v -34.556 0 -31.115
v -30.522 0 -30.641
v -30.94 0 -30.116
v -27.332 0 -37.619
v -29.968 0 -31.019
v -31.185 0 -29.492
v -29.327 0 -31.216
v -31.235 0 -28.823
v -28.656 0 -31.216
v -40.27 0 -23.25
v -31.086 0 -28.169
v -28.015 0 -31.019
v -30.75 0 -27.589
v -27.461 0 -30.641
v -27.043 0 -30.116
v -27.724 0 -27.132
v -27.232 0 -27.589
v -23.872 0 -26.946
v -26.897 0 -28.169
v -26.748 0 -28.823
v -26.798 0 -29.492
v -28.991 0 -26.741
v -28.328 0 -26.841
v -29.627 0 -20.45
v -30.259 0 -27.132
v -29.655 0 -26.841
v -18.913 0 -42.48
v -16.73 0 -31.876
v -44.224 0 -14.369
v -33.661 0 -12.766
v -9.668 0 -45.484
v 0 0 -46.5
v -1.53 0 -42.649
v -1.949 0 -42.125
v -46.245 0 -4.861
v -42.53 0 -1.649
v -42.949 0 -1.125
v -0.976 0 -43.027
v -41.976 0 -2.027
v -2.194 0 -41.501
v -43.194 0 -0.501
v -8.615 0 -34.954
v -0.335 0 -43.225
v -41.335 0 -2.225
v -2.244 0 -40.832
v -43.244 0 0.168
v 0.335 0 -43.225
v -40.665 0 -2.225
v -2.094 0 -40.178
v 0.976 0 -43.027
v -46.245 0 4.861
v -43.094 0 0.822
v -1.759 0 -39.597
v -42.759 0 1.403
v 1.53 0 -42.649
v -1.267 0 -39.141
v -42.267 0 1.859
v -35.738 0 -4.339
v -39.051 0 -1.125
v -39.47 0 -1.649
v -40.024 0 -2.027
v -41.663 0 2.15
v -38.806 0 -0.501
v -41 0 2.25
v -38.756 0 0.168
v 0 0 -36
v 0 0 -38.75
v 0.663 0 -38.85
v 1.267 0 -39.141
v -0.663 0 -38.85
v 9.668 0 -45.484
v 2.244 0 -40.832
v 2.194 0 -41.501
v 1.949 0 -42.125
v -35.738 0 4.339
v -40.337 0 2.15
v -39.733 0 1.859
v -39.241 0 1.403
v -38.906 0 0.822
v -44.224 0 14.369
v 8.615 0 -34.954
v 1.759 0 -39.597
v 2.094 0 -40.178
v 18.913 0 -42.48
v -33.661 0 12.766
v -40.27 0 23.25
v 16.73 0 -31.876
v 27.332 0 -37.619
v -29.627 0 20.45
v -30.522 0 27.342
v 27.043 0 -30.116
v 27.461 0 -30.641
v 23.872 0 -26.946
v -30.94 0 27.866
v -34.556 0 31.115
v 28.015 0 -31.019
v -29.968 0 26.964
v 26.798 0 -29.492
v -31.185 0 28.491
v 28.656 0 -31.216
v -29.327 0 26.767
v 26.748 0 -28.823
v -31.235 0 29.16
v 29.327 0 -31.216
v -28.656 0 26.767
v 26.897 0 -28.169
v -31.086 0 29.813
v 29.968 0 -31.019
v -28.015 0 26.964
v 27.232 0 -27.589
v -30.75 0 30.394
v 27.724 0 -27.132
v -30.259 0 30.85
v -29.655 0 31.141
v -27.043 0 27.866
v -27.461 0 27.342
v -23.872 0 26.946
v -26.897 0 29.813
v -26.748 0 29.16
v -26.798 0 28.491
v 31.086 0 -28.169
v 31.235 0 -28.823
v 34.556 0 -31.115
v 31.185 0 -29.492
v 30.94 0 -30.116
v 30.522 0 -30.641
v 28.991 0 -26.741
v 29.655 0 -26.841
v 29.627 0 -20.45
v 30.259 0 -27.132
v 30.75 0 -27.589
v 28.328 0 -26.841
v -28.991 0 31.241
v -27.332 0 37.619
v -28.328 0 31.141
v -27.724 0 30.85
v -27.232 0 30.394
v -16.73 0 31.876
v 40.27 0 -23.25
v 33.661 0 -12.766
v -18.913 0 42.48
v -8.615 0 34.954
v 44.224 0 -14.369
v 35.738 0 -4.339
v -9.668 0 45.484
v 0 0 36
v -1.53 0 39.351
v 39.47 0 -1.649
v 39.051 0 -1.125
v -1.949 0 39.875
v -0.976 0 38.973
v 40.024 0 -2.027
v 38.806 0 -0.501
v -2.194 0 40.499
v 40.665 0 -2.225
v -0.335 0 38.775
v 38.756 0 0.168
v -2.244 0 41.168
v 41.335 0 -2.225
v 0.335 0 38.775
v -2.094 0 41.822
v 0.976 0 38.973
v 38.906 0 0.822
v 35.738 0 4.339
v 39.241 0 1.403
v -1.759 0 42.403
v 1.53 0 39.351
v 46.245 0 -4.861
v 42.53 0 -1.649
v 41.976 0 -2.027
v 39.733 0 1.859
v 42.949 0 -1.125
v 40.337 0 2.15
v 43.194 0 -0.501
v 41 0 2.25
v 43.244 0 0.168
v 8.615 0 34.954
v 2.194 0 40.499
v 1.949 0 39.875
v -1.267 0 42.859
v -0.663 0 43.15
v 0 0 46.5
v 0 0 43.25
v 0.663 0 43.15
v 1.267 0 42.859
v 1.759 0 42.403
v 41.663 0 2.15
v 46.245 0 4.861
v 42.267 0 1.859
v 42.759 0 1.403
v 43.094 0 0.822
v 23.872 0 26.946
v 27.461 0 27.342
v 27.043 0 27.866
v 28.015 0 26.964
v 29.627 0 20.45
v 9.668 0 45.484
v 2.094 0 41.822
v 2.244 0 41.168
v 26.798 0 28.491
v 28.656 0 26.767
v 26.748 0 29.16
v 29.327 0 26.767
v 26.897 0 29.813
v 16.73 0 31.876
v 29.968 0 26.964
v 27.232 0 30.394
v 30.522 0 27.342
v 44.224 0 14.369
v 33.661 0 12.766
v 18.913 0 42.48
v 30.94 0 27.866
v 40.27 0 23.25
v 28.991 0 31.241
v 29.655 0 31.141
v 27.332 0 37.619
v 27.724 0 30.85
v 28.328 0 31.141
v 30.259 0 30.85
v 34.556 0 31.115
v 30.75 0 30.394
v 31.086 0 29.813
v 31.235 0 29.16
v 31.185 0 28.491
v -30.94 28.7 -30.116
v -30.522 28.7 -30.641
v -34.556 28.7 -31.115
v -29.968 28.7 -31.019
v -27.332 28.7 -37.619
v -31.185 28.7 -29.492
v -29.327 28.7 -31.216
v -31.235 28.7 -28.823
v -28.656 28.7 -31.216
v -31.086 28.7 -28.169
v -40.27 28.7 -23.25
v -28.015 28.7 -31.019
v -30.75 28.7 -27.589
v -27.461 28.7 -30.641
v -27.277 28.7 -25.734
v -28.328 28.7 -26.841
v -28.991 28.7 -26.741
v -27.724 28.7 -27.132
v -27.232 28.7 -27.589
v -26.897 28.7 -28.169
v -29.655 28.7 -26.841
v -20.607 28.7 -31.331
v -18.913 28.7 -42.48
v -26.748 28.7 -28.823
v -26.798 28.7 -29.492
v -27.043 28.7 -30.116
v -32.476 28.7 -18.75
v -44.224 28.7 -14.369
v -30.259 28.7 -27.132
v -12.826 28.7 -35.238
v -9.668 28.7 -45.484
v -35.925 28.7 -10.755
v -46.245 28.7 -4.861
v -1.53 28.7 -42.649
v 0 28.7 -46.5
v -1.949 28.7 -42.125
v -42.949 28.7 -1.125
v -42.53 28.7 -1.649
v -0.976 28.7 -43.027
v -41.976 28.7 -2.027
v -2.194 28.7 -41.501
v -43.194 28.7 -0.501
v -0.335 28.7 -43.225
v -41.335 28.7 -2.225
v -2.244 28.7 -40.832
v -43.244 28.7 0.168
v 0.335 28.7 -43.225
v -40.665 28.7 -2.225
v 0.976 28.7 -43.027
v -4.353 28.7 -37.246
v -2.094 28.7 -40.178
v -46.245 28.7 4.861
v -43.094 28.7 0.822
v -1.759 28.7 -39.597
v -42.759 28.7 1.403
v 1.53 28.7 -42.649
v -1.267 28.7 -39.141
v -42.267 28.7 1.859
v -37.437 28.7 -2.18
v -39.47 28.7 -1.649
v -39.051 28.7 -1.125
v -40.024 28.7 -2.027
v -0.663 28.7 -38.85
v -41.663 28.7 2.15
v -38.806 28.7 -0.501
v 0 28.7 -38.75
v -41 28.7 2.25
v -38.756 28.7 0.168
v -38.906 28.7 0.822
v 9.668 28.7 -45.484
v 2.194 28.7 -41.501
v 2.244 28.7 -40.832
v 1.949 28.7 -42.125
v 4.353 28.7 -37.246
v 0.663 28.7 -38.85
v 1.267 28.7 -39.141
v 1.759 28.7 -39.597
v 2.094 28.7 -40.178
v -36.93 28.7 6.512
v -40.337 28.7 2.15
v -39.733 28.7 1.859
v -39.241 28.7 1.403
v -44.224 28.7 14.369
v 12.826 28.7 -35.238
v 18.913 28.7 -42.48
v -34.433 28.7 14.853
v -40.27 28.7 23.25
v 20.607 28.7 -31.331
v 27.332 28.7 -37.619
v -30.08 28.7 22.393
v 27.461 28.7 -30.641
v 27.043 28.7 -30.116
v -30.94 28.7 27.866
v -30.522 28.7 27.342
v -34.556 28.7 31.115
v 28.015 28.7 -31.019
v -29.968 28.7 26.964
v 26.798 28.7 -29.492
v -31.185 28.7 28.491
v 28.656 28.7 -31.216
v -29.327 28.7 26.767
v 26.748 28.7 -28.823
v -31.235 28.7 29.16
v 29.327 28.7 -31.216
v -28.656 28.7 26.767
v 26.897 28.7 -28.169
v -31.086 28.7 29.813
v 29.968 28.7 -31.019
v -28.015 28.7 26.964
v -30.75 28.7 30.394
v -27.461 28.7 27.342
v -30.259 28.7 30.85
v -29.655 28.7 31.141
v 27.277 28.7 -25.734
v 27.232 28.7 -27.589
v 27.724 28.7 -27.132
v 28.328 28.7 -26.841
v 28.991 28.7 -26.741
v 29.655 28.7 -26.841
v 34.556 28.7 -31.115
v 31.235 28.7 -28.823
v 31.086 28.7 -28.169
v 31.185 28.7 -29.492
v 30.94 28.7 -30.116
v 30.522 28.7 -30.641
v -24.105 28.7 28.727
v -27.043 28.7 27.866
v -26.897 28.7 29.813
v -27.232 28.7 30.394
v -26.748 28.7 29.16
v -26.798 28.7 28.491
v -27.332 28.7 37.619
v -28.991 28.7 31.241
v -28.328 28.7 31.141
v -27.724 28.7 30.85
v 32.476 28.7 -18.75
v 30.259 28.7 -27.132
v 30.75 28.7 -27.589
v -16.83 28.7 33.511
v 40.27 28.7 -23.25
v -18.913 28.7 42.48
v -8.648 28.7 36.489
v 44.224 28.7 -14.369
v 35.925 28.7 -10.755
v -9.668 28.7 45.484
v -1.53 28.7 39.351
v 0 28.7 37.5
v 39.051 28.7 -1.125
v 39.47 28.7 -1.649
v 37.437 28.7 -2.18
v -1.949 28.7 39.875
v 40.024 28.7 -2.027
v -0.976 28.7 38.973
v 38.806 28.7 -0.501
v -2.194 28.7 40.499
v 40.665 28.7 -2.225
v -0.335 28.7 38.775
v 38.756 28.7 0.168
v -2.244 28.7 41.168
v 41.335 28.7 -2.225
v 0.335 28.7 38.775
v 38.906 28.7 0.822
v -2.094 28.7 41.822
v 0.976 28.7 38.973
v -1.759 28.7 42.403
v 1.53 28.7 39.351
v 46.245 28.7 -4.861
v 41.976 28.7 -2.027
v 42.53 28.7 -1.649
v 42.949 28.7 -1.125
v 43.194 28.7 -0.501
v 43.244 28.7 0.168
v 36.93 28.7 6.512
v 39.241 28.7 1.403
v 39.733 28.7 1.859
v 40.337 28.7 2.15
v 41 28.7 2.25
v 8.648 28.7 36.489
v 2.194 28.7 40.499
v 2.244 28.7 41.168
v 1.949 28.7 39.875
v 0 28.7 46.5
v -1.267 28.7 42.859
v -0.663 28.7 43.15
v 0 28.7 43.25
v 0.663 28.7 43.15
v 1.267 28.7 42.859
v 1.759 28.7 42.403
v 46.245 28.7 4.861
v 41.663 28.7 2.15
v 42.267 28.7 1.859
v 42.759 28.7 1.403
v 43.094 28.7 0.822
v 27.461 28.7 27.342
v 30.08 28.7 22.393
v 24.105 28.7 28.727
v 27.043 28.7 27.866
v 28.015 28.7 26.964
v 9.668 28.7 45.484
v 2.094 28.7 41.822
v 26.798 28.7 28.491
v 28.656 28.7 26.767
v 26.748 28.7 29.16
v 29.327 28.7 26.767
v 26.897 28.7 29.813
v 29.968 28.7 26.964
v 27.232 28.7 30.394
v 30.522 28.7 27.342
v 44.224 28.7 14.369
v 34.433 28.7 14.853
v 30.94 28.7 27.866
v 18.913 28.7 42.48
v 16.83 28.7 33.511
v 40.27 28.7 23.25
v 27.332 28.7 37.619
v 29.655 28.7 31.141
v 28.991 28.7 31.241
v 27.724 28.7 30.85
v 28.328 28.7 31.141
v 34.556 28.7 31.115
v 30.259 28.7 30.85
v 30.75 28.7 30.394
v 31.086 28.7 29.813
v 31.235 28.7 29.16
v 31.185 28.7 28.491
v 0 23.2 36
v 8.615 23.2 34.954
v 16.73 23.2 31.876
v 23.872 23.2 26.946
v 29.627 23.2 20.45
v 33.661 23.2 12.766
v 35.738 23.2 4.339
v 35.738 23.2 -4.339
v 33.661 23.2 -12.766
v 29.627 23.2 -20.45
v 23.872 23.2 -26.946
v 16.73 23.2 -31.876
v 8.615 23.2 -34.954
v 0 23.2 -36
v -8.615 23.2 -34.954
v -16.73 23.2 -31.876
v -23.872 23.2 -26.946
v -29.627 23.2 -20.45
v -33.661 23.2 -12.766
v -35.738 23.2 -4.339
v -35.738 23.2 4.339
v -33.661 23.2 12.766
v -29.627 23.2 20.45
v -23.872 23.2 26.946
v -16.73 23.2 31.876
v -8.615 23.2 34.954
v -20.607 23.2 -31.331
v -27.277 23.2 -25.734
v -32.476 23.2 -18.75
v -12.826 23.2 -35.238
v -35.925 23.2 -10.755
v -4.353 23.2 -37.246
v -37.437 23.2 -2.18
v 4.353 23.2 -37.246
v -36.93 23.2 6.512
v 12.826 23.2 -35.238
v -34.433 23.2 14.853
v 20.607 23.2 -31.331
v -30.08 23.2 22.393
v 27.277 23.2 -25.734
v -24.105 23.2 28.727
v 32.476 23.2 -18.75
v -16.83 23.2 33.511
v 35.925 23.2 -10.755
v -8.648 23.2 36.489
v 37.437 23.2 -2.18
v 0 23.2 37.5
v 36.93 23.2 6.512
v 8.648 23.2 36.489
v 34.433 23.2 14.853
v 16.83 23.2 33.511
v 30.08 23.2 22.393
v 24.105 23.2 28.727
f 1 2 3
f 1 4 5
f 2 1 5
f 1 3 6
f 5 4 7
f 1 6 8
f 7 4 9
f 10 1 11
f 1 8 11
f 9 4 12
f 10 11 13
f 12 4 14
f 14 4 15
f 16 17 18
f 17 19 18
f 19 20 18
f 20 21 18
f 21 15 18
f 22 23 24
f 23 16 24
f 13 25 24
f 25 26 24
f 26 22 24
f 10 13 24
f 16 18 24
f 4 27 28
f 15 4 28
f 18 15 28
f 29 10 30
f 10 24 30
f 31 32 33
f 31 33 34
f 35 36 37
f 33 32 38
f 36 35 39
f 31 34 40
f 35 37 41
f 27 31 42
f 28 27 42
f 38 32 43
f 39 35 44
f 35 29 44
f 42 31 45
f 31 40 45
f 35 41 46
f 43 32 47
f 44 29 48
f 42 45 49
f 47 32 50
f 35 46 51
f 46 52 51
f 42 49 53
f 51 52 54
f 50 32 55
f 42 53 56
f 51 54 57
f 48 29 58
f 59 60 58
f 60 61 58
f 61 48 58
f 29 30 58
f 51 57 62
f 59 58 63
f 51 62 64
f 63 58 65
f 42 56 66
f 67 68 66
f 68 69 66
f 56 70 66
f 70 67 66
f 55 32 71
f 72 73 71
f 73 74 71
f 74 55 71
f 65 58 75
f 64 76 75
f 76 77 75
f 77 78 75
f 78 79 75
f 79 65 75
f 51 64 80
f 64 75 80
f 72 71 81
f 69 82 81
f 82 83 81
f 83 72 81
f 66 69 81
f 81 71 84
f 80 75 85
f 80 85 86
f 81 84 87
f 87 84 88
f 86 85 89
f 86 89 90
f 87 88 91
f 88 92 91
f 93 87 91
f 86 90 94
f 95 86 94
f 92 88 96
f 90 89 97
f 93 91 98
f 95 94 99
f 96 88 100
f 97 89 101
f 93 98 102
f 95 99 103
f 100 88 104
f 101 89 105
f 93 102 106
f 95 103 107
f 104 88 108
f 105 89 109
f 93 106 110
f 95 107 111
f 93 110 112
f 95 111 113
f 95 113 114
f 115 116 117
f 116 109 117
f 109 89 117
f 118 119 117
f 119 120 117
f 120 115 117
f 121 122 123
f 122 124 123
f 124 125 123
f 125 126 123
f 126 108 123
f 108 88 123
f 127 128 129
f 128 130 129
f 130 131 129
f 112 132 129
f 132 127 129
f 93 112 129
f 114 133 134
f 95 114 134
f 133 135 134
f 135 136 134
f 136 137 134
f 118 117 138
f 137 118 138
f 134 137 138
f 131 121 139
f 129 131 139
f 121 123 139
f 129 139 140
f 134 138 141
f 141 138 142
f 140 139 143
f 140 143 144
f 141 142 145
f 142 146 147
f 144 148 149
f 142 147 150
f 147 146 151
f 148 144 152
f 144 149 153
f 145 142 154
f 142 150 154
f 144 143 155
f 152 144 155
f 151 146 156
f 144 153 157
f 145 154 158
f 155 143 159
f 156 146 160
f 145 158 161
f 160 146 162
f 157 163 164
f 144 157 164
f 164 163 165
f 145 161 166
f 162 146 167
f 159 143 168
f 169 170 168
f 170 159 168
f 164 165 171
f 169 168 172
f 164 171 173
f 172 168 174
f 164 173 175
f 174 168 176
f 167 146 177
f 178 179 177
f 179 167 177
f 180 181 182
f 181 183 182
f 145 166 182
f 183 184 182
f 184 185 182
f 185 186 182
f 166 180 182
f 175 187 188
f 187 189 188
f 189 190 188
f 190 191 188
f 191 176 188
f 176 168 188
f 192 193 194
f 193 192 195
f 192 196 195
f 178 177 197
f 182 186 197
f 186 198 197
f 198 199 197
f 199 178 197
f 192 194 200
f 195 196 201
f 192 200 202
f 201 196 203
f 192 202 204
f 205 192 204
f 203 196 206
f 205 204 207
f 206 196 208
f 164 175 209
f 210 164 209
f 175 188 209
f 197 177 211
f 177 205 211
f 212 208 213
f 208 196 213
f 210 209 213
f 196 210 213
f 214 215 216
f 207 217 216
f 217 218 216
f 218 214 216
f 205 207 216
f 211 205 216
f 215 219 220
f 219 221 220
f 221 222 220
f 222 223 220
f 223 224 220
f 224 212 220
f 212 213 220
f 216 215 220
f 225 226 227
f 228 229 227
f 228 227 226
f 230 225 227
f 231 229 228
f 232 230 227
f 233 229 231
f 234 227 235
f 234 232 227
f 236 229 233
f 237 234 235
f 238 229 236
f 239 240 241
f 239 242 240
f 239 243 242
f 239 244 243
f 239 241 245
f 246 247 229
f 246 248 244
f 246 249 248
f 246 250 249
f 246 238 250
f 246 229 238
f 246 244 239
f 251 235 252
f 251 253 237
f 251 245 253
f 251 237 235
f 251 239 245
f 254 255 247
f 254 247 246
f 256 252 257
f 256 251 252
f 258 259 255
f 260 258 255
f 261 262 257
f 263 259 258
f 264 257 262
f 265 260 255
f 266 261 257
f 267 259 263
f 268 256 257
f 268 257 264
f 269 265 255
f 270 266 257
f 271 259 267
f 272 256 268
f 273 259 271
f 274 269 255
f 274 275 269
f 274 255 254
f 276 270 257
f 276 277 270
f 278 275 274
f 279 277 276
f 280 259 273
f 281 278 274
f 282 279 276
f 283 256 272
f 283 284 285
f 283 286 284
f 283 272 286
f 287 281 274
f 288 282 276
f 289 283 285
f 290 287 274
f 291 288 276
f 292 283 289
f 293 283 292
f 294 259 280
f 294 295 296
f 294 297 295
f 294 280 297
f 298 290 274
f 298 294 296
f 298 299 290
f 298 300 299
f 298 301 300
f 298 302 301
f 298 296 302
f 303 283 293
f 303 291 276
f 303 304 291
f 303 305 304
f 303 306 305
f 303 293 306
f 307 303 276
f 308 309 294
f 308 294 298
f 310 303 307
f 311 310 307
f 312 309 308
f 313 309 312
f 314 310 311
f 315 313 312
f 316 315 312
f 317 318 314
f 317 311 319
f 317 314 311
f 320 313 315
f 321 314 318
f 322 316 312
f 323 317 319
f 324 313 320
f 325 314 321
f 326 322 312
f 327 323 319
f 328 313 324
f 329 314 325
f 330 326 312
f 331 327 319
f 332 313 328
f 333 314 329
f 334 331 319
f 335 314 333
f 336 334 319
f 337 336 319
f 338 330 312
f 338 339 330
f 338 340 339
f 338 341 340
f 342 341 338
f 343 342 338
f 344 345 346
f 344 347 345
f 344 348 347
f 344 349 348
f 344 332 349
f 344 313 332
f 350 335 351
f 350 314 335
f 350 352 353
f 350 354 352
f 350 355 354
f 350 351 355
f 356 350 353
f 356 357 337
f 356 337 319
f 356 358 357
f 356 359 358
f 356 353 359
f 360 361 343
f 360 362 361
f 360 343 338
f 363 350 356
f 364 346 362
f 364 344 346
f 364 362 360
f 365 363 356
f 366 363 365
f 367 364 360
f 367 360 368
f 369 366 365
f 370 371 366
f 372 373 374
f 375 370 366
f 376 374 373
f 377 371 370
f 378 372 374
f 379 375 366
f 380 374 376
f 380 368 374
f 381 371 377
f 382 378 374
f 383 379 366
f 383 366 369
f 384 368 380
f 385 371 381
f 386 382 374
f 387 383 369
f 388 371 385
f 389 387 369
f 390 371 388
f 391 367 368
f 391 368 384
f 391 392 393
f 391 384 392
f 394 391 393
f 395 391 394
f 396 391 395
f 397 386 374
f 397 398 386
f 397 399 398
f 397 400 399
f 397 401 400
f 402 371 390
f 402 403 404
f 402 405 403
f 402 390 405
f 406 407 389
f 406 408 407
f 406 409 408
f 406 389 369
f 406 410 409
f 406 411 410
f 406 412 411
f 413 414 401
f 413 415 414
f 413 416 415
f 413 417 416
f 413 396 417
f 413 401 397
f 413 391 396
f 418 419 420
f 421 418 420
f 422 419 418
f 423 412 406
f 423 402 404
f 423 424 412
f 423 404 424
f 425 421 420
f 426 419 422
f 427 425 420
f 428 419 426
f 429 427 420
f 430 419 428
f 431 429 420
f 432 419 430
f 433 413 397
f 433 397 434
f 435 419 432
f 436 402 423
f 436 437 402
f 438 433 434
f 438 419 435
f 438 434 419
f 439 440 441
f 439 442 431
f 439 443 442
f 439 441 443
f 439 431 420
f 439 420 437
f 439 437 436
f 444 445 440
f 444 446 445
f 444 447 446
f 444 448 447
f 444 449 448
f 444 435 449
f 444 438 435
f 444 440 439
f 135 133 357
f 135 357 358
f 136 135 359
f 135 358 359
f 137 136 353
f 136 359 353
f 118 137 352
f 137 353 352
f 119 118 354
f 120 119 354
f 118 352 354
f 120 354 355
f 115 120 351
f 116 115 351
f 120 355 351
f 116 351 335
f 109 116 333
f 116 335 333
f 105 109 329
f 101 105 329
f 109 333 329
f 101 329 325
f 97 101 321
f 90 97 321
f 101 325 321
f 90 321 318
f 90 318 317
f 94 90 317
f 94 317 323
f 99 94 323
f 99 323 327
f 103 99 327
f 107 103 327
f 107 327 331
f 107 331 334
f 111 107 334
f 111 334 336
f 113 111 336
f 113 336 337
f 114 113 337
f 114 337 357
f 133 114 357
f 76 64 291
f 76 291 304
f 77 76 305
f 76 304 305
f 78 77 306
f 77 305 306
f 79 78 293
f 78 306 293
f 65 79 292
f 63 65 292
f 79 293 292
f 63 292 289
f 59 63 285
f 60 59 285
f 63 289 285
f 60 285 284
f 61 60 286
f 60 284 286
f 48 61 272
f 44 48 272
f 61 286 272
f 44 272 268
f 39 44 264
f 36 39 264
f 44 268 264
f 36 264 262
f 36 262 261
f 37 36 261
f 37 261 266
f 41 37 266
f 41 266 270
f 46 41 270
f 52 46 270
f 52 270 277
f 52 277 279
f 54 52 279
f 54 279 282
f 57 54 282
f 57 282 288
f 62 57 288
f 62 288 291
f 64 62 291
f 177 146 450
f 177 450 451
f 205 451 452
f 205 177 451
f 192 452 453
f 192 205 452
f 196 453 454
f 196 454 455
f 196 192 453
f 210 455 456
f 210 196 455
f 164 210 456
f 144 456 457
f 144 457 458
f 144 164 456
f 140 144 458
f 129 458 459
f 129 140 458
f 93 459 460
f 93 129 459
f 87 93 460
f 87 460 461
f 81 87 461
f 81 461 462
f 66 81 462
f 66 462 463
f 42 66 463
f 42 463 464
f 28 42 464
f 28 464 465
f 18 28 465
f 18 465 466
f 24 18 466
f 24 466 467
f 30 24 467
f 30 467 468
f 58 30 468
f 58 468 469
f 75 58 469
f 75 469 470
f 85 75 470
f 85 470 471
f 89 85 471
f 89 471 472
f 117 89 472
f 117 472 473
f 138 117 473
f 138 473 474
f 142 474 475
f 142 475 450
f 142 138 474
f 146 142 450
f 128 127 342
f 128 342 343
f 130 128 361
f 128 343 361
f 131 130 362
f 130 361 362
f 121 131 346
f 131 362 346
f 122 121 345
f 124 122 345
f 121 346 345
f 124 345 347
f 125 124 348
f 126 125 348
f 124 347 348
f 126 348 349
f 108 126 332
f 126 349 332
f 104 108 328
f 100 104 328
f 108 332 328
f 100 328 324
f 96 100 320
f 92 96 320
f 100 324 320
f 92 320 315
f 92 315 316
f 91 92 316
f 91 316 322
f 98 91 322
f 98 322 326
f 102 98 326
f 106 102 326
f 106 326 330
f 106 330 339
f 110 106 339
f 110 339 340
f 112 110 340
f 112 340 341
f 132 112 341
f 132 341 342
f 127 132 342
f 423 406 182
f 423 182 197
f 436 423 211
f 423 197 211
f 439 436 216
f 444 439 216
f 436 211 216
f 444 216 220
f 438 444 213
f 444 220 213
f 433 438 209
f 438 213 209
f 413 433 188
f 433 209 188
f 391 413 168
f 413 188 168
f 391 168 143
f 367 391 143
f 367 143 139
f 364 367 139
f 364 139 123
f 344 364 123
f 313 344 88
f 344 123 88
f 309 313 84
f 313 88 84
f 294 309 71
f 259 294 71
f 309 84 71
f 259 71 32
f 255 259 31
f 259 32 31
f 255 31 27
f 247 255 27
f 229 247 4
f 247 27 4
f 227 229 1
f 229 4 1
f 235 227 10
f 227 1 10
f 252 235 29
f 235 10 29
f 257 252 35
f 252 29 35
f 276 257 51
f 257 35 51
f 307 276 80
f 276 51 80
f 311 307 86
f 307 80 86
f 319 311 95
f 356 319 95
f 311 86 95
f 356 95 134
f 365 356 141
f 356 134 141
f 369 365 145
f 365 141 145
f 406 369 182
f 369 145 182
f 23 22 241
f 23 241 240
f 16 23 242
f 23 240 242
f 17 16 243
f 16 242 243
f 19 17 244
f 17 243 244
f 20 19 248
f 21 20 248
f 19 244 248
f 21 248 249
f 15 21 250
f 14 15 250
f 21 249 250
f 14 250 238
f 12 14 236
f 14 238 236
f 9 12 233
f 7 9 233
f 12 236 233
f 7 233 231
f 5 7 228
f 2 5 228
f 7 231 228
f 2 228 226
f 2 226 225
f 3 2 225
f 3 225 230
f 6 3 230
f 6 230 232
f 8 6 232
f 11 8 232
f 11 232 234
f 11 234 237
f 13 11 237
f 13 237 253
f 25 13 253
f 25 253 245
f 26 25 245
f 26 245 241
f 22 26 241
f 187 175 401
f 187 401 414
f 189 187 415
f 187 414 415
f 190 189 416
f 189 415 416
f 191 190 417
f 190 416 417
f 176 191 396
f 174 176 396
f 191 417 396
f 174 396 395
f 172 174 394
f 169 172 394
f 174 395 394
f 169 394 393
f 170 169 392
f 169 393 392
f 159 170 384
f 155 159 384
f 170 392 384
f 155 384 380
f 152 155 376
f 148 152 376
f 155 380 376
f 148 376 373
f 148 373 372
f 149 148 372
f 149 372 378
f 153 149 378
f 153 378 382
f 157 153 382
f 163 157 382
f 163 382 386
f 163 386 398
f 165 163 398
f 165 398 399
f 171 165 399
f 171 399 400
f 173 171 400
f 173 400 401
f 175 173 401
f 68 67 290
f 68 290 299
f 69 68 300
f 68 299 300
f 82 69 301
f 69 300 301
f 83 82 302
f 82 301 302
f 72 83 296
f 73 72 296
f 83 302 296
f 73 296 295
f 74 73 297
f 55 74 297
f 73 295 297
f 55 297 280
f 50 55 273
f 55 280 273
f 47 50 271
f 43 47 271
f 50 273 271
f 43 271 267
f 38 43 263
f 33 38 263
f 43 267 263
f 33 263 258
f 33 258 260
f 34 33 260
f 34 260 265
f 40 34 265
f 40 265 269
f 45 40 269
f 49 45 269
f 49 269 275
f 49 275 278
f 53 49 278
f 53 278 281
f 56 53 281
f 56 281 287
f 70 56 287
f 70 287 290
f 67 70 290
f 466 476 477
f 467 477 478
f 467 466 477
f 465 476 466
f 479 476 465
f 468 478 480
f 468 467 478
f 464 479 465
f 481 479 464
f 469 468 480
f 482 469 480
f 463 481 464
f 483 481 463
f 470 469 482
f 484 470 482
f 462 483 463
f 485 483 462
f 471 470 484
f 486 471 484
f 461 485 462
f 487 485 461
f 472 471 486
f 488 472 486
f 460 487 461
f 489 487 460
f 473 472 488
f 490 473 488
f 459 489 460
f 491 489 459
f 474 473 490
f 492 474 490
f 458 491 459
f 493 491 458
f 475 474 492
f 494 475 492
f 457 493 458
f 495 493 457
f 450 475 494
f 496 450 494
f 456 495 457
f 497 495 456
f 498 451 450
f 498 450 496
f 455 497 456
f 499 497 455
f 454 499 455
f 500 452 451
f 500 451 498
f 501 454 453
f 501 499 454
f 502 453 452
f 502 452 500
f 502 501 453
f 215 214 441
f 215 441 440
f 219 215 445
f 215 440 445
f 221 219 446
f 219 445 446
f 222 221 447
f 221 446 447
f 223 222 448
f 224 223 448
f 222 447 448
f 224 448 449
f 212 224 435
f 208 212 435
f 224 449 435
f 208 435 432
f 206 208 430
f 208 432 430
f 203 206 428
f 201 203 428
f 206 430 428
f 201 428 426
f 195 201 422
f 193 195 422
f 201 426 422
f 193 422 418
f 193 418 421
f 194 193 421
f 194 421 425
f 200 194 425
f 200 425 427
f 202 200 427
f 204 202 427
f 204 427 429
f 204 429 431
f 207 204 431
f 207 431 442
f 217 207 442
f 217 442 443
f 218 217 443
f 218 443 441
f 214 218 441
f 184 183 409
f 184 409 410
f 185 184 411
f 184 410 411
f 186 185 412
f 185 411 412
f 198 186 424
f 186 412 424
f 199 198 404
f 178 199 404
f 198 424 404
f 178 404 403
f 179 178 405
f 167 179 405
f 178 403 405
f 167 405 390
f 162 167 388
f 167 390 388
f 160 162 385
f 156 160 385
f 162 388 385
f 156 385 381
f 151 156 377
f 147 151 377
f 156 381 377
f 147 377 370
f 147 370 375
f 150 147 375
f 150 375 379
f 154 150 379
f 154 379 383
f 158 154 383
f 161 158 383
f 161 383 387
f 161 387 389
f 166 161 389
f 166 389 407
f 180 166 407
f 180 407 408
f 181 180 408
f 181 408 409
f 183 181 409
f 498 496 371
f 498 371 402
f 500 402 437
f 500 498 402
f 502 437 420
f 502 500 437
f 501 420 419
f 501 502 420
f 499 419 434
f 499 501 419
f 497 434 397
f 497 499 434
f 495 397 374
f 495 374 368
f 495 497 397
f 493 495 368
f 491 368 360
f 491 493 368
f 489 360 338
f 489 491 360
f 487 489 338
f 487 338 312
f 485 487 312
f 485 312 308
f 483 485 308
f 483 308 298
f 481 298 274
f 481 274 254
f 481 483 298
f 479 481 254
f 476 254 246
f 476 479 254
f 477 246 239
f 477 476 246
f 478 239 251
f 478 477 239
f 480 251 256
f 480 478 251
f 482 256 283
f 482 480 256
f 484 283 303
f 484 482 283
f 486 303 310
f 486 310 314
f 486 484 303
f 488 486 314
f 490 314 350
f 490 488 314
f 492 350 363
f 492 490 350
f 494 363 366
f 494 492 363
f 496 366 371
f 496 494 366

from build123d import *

# Parameters (mm, degrees)
SKETCH1_R           = 46.5
SKETCH1_R_2         = 36
BOSS_EXTRUDE1_DEPTH = 28.7
SKETCH2_R           = 2.25
CUT_EXTRUDE1_DEPTH  = 72.750888496
CUT_EXTRUDE2_START  = -5.5
SKETCH3_R           = 37.5
SKETCH3_R_2         = 36
CUT_EXTRUDE2_DEPTH  = 5.5


with BuildPart() as part:
    # Sketch1 → Boss-Extrude1 (new body)
    with BuildSketch(Plane(origin=(0, 0, 0), x_dir=(1, 0, 0), z_dir=(0, 1, 0))):
        with Locations(Location((0, 0, 0), (0, 0, 270))):
            Circle(SKETCH1_R)
        with Locations(Location((0, 0, 0), (0, 0, 270))):
            Circle(SKETCH1_R_2, mode=Mode.SUBTRACT)
    extrude(amount=BOSS_EXTRUDE1_DEPTH)

    # Sketch2 → Cut-Extrude1 (cut, through all)
    with BuildSketch(Plane(origin=(0, 28.7, 0), x_dir=(1, 0, 0), z_dir=(0, 1, 0))):
        with Locations(Location((0, 41, 0), (0, 0, 270))):
            Circle(SKETCH2_R)
        with Locations(Location((28.991378029, 28.991378029, 0), (0, 0, 270))):
            Circle(SKETCH2_R)
        with Locations(Location((41, 0, 0), (0, 0, 270))):
            Circle(SKETCH2_R)
        with Locations(Location((28.991378029, -28.991378029, 0), (0, 0, 270))):
            Circle(SKETCH2_R)
        with Locations(Location((0, -41, 0), (0, 0, 270))):
            Circle(SKETCH2_R)
        with Locations(Location((-28.991378029, -28.991378029, 0), (0, 0, 270))):
            Circle(SKETCH2_R)
        with Locations(Location((-41, 0, 0), (0, 0, 270))):
            Circle(SKETCH2_R)
        with Locations(Location((-28.991378029, 28.991378029, 0), (0, 0, 270))):
            Circle(SKETCH2_R)
    extrude(amount=-CUT_EXTRUDE1_DEPTH, mode=Mode.SUBTRACT)

    # Sketch3 → Cut-Extrude2 (cut)
    with BuildSketch(Plane(origin=(0, 28.7, 0), x_dir=(1, 0, 0), z_dir=(0, 1, 0)).offset(CUT_EXTRUDE2_START)):
        with Locations(Location((0, 0, 0), (0, 0, 270))):
            Circle(SKETCH3_R)
        with Locations(Location((0, 0, 0), (0, 0, 270))):
            Circle(SKETCH3_R_2, mode=Mode.SUBTRACT)
    extrude(amount=CUT_EXTRUDE2_DEPTH, mode=Mode.SUBTRACT)


solid = part.part
